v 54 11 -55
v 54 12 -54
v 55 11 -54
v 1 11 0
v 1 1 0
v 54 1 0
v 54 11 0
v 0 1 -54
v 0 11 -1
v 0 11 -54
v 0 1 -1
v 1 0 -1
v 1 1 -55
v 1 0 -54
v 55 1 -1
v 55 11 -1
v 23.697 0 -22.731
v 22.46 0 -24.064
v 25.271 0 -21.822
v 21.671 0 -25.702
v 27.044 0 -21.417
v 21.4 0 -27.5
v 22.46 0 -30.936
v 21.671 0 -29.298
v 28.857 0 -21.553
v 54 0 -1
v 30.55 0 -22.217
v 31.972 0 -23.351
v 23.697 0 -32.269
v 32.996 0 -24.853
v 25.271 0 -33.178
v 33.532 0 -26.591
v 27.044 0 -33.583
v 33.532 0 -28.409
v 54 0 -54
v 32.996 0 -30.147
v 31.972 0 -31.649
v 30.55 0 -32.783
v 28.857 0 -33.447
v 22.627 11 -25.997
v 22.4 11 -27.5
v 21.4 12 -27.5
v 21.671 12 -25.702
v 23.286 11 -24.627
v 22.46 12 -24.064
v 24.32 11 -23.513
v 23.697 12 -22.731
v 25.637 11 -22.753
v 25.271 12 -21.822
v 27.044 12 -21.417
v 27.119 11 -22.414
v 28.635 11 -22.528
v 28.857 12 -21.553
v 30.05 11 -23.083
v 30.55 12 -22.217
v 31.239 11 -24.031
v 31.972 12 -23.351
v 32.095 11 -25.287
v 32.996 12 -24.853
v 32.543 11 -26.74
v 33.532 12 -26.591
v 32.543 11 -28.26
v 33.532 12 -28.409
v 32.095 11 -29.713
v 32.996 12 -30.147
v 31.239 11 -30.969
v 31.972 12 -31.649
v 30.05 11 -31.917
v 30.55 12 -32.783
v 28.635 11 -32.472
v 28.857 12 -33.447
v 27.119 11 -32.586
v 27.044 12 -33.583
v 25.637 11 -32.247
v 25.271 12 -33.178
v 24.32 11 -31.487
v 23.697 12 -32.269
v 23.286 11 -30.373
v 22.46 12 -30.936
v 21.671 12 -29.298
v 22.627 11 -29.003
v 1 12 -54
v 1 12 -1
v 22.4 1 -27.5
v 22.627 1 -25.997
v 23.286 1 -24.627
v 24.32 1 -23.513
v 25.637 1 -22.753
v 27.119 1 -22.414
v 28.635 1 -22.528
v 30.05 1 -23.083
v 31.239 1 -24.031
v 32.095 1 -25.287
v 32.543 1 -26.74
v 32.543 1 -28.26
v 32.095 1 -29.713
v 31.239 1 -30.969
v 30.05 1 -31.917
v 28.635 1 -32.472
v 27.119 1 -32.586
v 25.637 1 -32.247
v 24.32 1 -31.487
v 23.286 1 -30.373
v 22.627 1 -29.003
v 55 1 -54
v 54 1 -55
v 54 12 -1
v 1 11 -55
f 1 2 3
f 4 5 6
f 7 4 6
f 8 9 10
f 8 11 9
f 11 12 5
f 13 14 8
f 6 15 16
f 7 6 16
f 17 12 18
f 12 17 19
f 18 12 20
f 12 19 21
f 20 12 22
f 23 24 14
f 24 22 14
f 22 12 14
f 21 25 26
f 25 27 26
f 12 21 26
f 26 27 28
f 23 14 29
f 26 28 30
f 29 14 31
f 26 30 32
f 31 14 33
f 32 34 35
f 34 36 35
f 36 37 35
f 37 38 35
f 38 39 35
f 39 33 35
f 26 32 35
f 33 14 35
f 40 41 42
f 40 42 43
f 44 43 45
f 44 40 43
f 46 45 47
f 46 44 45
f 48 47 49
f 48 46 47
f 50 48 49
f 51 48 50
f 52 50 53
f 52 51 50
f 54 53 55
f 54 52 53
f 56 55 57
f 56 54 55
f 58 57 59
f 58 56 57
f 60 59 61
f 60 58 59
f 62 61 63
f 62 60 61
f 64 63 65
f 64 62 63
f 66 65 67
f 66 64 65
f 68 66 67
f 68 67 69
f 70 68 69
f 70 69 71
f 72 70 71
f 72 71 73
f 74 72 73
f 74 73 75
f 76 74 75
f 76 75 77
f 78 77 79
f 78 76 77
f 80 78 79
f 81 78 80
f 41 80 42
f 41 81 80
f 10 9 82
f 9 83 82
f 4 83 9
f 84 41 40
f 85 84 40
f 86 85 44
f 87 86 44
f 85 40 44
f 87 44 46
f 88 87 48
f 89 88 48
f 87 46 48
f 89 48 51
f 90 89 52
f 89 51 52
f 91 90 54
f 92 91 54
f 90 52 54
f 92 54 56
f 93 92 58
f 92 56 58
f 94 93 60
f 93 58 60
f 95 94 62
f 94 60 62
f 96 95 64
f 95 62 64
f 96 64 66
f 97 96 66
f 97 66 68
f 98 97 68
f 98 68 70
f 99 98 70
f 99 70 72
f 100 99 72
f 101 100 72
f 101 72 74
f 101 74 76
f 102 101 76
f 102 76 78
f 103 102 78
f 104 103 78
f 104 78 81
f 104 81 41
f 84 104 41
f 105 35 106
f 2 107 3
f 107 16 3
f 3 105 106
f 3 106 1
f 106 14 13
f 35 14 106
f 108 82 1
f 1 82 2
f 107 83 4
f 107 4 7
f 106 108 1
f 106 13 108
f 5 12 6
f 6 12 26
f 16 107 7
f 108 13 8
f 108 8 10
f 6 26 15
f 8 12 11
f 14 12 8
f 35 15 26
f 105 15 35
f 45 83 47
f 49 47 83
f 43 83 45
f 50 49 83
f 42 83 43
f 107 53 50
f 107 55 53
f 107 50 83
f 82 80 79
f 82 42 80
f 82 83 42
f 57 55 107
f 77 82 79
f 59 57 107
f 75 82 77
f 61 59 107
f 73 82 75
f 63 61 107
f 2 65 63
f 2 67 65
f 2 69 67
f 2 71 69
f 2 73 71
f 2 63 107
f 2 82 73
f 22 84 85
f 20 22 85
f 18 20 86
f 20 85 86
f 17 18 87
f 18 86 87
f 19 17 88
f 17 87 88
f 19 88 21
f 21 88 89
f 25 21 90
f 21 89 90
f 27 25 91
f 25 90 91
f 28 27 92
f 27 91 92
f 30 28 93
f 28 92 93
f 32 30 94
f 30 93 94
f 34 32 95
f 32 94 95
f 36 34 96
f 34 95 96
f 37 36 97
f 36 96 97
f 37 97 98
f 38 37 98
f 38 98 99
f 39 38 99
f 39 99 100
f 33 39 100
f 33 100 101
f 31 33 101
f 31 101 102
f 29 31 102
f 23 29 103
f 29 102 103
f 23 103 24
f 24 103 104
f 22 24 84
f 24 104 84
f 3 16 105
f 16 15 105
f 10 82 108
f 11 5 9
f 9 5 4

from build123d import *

# Parameters (mm, degrees)
ESQUISSE1_W        = 55
ESQUISSE1_H        = 55
BOSS_EXTRU_1_DEPTH = 12
TROU_TARAUD_M121_D = 10.2
CHANFREIN1_SIZE    = 1


with BuildPart() as part:
    # Esquisse1 → Boss.-Extru.1 (new body)
    with BuildSketch(Plane(origin=(0, 0, 0), x_dir=(1, 0, 0), z_dir=(0, 1, 0))):
        with Locations((27.5, 27.5)):
            Rectangle(ESQUISSE1_W, ESQUISSE1_H)
    extrude(amount=BOSS_EXTRU_1_DEPTH)

    # Trou taraudé M121 (through all)
    with Locations(Plane.XZ):
        with Locations((27.5, -27.5)):
            Hole(TROU_TARAUD_M121_D / 2)

    # Chanfrein1
    chanfrein1_edges = [part.edges().sort_by_distance(p)[0] for p in [
        (55, 12, -27.5),
        (27.5, 12, -55),
        (32.6, 0, -27.5),
        (32.6, 12, -27.5),
        (0, 12, -27.5),
        (27.5, 0, -55),
        (55, 0, -27.5),
        (27.5, 0, 0),
        (0, 0, -27.5),
        (27.5, 12, 0),
        (0, 6, -55),
        (55, 6, -55),
        (55, 6, 0),
        (0, 6, 0),
    ]]
    chamfer(chanfrein1_edges, length=CHANFREIN1_SIZE)


solid = part.part
